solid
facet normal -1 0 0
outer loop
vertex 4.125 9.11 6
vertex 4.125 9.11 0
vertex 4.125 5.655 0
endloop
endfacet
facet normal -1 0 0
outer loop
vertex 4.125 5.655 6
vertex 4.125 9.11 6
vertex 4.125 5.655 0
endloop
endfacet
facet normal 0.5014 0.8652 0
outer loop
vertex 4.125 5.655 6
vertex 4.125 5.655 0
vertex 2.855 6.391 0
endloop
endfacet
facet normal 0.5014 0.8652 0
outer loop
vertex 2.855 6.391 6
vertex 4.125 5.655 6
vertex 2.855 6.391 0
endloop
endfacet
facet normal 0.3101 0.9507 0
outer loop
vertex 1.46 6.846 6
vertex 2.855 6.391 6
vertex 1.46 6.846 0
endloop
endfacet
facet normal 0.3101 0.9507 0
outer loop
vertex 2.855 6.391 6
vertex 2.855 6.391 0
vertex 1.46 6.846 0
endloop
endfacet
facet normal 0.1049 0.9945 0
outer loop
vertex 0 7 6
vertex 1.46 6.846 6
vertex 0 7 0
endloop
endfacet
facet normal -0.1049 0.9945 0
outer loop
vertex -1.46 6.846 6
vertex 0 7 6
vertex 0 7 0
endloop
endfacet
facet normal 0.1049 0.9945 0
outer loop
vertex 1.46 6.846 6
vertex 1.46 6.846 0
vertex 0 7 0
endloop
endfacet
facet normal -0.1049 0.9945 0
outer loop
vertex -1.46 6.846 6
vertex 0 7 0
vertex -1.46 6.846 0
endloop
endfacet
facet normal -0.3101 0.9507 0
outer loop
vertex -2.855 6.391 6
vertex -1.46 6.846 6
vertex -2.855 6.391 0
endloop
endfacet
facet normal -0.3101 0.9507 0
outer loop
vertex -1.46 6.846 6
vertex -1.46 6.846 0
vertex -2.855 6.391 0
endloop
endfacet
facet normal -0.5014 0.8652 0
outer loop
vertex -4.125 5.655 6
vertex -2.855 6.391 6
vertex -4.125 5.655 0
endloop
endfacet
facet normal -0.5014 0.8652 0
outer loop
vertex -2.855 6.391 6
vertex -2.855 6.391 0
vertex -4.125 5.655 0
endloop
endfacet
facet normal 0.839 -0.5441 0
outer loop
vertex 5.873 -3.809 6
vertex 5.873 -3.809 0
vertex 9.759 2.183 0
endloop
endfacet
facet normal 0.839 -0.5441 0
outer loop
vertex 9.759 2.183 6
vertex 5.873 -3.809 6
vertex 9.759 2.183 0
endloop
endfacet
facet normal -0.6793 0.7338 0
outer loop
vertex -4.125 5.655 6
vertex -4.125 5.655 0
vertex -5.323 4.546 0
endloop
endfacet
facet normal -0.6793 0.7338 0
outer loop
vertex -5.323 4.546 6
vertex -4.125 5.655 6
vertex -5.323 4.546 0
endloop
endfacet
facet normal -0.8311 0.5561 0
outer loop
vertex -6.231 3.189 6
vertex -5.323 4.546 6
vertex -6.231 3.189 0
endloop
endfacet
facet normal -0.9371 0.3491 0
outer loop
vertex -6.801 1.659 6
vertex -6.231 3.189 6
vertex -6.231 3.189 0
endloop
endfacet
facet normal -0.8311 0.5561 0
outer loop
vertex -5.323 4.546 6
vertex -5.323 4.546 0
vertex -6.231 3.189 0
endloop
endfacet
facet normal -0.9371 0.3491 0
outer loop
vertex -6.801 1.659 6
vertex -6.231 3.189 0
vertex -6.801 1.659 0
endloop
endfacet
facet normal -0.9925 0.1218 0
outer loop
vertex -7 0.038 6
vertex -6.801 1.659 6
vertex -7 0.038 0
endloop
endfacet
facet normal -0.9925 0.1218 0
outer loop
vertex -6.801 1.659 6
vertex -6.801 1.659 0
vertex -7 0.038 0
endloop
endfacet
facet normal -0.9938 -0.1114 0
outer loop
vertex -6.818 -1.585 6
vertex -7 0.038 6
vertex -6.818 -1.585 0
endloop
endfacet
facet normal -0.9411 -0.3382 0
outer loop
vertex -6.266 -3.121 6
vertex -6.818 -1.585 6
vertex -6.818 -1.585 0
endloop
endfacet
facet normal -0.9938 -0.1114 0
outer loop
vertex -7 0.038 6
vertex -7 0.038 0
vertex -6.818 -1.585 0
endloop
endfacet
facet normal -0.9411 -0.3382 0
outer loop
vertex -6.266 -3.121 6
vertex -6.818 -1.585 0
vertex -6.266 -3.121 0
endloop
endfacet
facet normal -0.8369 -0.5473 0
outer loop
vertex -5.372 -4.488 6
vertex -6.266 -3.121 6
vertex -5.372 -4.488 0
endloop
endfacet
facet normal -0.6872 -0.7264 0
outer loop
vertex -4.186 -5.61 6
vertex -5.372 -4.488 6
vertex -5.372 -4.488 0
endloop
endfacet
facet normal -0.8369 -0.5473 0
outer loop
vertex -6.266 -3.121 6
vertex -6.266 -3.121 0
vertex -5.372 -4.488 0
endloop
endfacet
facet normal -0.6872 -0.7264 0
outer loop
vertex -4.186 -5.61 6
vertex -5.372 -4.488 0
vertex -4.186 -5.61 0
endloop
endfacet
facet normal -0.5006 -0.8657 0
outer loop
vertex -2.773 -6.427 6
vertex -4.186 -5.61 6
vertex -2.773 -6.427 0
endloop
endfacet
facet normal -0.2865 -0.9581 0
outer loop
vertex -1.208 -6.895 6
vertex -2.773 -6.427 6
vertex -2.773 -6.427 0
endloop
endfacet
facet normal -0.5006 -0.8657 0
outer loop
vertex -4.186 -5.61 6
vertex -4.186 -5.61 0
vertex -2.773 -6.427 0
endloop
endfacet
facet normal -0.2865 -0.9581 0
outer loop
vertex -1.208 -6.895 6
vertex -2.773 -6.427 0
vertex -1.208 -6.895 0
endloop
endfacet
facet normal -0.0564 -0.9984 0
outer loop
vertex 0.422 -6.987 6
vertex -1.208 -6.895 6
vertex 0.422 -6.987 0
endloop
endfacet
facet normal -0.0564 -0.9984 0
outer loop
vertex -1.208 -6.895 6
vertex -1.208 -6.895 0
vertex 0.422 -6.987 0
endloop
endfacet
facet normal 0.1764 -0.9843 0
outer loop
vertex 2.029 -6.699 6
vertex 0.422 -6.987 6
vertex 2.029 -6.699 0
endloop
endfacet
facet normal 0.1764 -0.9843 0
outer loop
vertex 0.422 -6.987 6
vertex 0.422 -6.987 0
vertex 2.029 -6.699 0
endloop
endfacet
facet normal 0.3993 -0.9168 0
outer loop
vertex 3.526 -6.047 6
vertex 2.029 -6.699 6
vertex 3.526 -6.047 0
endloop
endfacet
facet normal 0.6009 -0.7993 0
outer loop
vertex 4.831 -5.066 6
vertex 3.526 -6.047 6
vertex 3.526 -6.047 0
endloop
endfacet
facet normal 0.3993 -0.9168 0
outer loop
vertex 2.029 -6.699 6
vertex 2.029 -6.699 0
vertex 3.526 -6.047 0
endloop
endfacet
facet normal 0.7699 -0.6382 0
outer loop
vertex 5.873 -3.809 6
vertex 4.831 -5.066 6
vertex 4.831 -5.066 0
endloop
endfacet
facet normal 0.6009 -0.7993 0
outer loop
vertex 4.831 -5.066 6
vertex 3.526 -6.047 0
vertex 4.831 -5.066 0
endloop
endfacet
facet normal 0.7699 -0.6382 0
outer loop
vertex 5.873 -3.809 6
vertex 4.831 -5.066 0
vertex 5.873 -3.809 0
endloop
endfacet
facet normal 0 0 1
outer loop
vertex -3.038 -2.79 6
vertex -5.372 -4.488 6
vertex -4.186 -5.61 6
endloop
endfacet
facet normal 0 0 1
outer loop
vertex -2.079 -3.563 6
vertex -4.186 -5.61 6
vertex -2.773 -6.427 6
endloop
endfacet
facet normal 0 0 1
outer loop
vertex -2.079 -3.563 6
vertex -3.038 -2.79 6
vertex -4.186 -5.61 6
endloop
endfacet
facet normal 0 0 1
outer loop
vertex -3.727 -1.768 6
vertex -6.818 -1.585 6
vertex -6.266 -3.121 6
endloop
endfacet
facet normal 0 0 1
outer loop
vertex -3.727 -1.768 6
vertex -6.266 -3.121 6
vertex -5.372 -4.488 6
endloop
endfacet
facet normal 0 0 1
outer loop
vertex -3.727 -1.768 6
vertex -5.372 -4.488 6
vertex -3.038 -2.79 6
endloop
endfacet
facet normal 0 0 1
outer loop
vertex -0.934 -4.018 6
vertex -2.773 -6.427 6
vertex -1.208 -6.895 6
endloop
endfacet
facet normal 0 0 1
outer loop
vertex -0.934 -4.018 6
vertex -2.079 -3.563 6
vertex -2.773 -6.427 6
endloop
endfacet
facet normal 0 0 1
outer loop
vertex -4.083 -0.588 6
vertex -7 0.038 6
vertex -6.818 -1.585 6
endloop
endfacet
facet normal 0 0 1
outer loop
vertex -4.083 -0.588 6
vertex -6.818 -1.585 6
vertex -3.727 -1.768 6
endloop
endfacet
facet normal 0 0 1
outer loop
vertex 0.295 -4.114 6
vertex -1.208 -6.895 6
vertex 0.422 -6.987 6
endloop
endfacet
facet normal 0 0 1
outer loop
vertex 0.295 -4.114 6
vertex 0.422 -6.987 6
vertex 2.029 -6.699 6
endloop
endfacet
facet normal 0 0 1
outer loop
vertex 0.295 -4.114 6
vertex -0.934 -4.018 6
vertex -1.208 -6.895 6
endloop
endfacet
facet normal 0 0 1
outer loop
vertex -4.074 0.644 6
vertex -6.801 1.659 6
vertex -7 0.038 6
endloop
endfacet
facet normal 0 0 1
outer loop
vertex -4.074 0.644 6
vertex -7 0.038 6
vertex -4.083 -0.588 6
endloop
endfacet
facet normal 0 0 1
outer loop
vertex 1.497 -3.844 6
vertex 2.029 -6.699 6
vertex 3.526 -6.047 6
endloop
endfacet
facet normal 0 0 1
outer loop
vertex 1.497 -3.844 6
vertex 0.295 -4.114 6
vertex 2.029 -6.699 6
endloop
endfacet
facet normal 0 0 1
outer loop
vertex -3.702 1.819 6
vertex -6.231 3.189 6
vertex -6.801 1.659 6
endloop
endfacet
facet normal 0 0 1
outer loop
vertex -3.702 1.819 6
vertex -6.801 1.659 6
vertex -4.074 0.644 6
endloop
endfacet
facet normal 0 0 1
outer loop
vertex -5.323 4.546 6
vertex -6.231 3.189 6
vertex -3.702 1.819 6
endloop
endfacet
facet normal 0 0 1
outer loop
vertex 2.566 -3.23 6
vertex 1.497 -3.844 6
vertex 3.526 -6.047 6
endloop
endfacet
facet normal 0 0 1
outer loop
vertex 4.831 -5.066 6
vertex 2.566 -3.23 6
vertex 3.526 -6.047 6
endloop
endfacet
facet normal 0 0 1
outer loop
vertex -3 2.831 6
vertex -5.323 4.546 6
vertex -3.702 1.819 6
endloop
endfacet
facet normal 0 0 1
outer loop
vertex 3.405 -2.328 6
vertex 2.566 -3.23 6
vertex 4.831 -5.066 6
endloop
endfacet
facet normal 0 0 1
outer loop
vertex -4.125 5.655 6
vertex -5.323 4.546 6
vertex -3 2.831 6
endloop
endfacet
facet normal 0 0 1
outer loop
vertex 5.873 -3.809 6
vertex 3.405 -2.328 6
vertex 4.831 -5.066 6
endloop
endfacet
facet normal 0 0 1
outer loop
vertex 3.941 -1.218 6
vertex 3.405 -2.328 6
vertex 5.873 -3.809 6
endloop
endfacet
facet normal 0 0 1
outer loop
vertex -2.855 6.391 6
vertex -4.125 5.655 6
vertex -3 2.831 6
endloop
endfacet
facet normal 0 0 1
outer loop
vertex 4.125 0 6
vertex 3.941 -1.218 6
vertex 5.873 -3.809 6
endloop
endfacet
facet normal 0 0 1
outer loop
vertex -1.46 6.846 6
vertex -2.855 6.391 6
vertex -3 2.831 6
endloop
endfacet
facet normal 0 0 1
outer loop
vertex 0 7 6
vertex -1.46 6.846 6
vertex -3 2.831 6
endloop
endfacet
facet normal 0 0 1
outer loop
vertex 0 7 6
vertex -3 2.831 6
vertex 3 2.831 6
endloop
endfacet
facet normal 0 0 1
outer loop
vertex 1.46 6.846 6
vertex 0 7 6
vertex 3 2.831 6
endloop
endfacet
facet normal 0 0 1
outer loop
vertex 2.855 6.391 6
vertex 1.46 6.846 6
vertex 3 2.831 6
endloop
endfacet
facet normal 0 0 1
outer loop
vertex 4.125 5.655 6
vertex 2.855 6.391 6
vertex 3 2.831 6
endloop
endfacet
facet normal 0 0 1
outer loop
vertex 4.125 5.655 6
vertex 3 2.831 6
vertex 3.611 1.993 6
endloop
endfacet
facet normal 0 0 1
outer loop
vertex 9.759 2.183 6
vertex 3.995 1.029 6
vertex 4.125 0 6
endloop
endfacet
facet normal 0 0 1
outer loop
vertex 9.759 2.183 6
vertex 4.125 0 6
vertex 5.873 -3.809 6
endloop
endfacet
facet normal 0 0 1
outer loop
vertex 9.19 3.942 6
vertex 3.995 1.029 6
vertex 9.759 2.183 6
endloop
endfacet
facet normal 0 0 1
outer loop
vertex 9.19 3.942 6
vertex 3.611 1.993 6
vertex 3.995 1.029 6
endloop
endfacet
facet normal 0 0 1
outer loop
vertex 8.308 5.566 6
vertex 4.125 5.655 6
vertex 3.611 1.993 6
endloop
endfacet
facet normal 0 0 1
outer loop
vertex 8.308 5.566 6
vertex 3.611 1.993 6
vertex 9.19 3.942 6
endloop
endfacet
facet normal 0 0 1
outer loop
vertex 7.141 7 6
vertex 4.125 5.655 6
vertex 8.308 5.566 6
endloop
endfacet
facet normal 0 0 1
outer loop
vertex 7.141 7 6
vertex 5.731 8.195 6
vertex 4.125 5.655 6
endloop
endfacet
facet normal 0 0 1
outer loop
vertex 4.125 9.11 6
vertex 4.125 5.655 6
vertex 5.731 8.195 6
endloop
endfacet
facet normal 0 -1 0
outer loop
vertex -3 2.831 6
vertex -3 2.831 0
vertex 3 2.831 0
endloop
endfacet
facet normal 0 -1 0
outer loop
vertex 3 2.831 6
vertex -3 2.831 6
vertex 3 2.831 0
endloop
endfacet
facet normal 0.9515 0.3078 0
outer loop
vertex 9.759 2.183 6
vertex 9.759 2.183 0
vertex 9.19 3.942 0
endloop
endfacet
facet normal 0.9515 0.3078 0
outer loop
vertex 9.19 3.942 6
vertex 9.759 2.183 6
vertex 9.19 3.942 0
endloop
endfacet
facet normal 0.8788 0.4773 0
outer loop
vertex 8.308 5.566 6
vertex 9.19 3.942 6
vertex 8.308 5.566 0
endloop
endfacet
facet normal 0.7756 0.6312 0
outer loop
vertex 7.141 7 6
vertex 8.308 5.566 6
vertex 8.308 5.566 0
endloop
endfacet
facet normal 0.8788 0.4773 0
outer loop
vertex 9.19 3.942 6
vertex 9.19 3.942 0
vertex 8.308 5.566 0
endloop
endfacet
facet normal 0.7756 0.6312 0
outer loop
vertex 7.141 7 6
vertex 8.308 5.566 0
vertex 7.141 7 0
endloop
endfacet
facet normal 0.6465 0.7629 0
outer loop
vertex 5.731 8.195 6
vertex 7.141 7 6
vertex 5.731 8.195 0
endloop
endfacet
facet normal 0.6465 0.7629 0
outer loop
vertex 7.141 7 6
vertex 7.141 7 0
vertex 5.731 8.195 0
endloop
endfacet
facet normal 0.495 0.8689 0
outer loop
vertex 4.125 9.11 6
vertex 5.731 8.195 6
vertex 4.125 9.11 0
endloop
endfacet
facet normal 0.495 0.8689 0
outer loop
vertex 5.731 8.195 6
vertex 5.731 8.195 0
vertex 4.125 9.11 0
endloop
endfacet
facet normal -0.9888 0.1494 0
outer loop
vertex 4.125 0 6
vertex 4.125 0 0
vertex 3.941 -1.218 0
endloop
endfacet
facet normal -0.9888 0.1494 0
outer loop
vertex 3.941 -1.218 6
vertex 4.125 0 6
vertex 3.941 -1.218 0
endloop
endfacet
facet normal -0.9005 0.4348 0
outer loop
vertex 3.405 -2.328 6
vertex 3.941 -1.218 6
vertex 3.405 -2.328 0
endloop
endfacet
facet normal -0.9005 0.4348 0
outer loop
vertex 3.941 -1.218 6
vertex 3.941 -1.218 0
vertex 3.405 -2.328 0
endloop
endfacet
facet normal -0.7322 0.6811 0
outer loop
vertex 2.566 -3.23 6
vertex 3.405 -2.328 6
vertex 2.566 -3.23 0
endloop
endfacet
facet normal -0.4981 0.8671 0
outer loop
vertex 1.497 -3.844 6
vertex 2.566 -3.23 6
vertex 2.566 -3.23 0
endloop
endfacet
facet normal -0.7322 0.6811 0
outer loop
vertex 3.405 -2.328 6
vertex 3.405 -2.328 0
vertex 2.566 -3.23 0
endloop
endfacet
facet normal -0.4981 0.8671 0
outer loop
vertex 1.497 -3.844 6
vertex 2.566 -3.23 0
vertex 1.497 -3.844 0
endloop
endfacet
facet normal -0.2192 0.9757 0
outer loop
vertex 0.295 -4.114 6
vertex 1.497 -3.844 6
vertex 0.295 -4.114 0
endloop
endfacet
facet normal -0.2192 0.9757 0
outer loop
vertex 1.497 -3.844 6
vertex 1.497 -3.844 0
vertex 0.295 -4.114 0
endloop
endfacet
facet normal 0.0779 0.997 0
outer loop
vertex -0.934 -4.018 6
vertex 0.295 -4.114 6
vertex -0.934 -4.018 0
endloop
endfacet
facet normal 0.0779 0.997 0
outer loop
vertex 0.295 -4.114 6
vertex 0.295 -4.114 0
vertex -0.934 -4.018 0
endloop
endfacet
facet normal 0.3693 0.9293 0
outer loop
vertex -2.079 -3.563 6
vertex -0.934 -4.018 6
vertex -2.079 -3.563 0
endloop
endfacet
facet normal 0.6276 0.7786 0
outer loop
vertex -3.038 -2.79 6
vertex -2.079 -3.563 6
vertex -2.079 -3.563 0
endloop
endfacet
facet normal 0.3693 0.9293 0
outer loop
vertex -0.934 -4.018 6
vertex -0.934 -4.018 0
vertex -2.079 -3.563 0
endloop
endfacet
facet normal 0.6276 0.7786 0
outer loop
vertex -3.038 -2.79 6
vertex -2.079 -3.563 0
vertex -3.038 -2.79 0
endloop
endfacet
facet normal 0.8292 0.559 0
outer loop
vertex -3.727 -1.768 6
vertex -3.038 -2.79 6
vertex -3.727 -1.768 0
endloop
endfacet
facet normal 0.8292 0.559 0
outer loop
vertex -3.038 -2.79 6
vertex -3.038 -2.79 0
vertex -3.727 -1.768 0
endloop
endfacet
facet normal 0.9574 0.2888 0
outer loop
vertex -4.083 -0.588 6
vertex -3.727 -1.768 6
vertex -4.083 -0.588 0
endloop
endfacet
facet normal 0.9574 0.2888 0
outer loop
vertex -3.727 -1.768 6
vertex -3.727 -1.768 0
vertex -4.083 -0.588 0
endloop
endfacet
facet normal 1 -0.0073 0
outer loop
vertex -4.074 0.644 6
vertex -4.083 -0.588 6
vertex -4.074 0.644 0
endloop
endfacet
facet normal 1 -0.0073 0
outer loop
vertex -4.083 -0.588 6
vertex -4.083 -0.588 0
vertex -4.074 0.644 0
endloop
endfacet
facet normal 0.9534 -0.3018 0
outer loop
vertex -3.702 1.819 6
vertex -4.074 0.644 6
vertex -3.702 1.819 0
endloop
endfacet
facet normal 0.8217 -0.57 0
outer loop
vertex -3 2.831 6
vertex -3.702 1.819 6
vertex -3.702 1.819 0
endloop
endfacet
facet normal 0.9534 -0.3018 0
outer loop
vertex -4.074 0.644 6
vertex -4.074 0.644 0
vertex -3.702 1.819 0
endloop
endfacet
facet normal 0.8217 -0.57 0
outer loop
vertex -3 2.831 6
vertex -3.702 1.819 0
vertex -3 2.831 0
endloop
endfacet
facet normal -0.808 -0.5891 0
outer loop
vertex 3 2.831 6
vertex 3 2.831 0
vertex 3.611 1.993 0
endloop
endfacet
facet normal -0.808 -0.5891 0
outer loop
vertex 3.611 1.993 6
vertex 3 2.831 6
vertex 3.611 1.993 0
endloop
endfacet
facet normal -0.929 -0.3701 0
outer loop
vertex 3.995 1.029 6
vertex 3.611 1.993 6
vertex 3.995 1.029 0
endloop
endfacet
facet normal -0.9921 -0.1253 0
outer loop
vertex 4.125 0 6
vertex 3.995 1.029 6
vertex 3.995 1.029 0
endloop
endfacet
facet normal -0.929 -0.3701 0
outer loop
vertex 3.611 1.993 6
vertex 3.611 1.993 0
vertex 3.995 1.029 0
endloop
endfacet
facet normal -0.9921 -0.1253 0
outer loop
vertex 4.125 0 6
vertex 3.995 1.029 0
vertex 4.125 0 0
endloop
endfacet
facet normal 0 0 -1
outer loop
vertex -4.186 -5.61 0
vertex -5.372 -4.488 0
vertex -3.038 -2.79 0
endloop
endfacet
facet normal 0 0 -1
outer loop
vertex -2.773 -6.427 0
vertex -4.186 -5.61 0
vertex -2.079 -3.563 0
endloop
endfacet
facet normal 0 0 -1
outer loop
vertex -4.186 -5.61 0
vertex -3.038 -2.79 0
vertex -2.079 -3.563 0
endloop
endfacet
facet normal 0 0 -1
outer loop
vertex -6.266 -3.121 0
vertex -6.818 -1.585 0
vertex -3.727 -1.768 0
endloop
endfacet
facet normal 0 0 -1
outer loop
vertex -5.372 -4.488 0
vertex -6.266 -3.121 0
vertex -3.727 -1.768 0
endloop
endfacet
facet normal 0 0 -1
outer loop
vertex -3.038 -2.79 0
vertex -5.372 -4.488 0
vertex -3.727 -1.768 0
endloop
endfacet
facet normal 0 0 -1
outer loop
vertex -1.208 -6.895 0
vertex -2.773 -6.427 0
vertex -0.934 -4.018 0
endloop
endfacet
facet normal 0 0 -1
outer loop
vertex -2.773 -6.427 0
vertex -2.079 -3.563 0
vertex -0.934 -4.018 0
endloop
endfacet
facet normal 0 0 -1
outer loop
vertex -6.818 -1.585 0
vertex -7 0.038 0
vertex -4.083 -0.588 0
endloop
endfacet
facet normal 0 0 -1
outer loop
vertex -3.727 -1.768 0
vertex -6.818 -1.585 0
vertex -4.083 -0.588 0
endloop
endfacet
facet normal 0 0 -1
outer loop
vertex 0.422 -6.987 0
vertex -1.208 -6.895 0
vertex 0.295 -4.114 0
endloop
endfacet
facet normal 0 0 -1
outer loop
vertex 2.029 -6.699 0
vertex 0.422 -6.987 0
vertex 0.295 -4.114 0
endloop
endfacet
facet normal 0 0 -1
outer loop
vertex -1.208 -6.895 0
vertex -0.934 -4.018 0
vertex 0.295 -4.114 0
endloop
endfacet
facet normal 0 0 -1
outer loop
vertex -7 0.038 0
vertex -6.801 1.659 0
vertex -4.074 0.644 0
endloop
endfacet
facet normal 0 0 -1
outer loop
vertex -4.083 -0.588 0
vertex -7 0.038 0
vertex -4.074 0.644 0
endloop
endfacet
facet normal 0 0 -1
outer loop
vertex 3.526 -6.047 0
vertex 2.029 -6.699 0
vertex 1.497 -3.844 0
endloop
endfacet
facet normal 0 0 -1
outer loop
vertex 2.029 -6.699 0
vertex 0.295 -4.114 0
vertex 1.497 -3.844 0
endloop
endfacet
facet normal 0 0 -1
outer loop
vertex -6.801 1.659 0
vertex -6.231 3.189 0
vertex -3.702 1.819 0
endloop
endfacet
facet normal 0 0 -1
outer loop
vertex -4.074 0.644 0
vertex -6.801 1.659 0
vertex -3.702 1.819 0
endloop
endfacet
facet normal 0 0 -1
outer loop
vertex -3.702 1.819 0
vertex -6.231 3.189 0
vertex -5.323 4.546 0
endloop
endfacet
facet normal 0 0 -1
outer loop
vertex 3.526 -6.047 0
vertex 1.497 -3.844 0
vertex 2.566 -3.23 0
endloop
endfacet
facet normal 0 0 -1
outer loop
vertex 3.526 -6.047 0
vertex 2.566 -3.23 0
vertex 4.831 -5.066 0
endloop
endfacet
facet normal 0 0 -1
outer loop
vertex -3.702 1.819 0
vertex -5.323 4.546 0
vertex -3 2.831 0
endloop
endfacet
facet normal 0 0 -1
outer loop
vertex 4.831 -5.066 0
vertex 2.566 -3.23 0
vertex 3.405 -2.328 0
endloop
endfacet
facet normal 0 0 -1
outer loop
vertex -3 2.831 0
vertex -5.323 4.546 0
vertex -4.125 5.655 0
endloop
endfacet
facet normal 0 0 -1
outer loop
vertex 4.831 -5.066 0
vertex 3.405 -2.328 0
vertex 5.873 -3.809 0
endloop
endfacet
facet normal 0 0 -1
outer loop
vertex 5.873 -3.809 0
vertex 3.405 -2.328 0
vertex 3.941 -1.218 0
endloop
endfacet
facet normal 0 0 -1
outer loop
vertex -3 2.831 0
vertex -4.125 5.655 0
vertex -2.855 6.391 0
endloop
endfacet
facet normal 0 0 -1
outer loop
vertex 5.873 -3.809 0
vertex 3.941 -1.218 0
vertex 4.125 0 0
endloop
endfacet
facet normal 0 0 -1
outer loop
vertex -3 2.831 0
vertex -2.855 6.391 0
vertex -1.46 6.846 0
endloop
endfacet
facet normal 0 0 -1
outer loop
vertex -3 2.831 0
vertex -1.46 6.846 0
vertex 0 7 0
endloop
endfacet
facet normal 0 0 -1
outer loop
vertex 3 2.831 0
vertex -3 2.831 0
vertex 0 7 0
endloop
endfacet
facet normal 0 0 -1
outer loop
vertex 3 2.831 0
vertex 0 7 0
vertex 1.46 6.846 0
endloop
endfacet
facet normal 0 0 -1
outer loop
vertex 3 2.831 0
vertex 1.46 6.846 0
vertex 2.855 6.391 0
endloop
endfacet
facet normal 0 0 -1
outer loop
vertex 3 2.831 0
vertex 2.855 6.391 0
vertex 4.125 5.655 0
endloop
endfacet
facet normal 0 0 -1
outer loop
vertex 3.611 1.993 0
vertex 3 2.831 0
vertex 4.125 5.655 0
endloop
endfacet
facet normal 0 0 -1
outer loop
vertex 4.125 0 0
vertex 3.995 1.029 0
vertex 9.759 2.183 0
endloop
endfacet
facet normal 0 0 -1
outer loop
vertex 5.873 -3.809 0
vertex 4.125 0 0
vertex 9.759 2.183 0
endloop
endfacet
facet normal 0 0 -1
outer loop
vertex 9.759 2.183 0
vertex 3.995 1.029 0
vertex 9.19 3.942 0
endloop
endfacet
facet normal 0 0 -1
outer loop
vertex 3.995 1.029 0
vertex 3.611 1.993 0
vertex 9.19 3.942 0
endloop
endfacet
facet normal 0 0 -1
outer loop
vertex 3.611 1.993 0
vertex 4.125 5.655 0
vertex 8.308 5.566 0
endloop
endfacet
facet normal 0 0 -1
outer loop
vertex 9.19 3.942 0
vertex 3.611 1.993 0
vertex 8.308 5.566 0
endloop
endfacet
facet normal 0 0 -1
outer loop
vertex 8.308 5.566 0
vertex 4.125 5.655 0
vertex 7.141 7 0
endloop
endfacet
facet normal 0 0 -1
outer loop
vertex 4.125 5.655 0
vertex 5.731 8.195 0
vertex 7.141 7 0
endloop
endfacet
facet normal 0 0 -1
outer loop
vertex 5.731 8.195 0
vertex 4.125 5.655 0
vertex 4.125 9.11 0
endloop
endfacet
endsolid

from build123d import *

# Parameters (mm, degrees)
F1_DEPTH = 6


with BuildPart() as f1:
    # F0 (on Top) → F1 (new body)
    with BuildSketch(Plane.XY):
        with BuildLine():
            ThreePointArc((-4.125, 5.655473), (-4.812056, -5.083711), (5.873261, -3.808517))
            ThreePointArc((5.873261, -3.808517), (6.712408, -1.985846), (7, 0))
            ThreePointArc((7, 0), (6.239992, 3.172144), (4.125, 5.655473))
            ThreePointArc((4.125, 5.655473), (0, 7), (-4.125, 5.655473))
        make_face()
        with BuildLine():
            ThreePointArc((3, 2.831188), (3.833447, 1.523257), (4.125, 0))
            ThreePointArc((4.125, 0), (-1.523257, -3.833447), (-3, 2.831188))
            ThreePointArc((-3, 2.831188), (0, 4.125), (3, 2.831188))
        make_face(mode=Mode.SUBTRACT)
        with BuildLine():
            Line((-3, 2.831188), (3, 2.831188))
            ThreePointArc((3, 2.831188), (0, 4.125), (-3, 2.831188))
        make_face()
        with BuildLine():
            Line((5.873261, -3.808517), (9.758726, 2.183408))
            ThreePointArc((9.758726, 2.183408), (7.757732, 6.310118), (4.125, 9.109576))
            Line((4.125, 9.109576), (4.125, 5.655473))
            ThreePointArc((4.125, 5.655473), (6.239992, 3.172144), (7, 0))
            ThreePointArc((7, 0), (6.712408, -1.985846), (5.873261, -3.808517))
        make_face()
    extrude(amount=F1_DEPTH)


solid = f1.part
